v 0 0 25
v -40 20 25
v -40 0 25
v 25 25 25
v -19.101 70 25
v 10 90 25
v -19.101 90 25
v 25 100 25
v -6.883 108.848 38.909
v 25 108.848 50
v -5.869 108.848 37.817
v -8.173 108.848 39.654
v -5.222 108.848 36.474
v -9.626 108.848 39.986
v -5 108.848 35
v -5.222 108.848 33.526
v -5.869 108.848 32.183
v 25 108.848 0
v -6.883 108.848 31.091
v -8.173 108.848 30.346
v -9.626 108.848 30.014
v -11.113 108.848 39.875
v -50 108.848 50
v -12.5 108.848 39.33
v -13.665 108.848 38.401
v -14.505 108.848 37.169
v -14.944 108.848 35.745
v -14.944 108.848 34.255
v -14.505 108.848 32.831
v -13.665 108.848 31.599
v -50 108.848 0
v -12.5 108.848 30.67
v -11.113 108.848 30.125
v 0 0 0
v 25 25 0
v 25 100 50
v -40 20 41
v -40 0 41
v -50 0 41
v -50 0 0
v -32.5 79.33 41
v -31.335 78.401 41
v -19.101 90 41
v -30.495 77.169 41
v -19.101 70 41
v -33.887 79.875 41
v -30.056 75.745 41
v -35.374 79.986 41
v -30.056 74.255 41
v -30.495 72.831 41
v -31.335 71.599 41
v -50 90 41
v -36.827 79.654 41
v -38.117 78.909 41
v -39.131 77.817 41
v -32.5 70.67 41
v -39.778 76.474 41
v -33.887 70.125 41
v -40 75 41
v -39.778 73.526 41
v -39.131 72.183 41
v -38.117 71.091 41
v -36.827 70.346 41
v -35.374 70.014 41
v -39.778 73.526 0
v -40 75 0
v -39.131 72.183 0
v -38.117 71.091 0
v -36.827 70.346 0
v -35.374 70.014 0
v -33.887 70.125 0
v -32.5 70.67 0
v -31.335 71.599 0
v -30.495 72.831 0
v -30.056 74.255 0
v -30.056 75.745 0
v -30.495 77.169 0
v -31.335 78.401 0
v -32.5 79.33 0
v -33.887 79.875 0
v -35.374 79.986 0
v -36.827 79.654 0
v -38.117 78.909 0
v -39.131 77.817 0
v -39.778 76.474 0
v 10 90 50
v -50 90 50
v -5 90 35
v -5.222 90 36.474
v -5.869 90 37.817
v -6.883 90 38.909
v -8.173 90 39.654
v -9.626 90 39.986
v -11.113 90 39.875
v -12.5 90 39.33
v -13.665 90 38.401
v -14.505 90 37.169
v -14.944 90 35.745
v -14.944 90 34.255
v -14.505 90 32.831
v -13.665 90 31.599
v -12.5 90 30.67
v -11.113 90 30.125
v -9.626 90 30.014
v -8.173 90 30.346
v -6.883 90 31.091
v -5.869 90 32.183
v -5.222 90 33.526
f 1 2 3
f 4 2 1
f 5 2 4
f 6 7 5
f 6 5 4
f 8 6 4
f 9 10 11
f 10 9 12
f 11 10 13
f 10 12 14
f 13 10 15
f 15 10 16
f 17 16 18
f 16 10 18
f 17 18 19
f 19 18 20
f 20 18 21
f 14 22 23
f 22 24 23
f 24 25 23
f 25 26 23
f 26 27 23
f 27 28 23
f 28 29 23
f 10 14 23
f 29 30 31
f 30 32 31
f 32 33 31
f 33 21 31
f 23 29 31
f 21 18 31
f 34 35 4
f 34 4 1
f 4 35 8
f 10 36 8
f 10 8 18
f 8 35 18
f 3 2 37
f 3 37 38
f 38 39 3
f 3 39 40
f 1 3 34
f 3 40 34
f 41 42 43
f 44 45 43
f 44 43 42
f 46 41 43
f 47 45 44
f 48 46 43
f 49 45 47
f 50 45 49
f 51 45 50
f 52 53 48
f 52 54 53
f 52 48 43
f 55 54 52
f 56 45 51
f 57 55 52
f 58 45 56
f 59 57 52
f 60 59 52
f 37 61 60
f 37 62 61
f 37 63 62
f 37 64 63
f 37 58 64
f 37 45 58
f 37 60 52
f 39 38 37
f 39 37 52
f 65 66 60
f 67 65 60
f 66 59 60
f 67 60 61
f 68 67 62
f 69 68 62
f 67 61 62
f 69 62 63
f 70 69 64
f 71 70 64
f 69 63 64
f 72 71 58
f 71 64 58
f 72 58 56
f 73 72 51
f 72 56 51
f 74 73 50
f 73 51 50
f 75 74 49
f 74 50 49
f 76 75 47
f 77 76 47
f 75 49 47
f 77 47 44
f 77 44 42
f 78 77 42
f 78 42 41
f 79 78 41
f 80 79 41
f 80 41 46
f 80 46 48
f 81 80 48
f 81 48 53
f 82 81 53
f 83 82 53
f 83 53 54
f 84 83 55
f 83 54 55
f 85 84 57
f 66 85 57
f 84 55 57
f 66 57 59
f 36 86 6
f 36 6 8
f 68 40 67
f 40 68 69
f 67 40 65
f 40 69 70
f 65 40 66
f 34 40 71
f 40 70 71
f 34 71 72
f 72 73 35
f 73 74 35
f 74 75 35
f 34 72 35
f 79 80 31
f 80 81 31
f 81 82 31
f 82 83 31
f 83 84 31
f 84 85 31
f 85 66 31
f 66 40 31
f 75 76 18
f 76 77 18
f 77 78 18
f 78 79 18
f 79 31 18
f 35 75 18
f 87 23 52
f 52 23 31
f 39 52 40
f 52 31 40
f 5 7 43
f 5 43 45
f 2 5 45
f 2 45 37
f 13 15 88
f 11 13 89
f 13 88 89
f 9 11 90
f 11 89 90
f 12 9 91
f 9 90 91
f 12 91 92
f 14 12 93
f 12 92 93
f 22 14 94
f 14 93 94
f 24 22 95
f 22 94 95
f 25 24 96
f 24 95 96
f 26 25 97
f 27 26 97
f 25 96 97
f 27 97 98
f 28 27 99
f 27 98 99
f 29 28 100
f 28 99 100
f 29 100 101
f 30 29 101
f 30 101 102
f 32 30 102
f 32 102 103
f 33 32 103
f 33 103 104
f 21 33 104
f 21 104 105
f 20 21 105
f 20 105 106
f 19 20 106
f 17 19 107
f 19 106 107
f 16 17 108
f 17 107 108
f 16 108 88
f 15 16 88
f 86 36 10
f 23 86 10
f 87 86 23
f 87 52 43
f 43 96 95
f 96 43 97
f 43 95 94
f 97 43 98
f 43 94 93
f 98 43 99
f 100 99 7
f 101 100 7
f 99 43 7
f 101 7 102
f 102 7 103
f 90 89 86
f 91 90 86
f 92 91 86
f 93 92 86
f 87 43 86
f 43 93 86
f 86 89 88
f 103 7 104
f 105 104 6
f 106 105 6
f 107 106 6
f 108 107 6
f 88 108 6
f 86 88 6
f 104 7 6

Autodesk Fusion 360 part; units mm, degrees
sketch "Sketch1" plane through (0, 0, 0) normal (0, 0, 1) x (1, 0, 0)
  line L0 (-50, 0) -> (0, 0)
  line L1 (25, 25) -> (0, 0)
  line L2 (-50, 0) -> (-50, 140)
  line L3 (21.9831, 108.8475) -> (-62.7657, 108.8475)
  line L4 (-50, 108.8475) -> (-62.7657, 108.8475)
  line L5 (25, 25) -> (25, 110)
  line L6 (21.9831, 108.8475) -> (25, 108.8475)
extrude "Extrude1" add sketch "Sketch1" along normal blind 25
sketch "Sketch2" plane through (0, 0, 25) normal (0, 0, 1) x (-1, 0, 0)
  line L0 (-25, -108.8475) -> (50, -108.8475)
  line L1 (50, -108.8475) -> (50, 0)
  line L2 (50, 0) -> (0, 0)
  line L3 (0, 0) -> (-25, -25)
  line L4 (-25, -25) -> (-25, -108.8475)
sketch "Sketch3" plane through (0, 0, 25) normal (0, 0, 1) x (-1, 0, 0)
  line L0 (-10, -90) -> (-25, -97)
  line L1 (-25, -108.8475) -> (-25, -97)
  line L2 (-10, -90) -> (50, -90)
  line L3 (19.1012, -90) -> (19.1012, -70)
  line L4 (19.1012, -70) -> (40, -20)
  line L5 (40, -20) -> (40, 0)
  line L6 (40, 0) -> (50, 0)
  line L7 (50, 0) -> (50, -108.8475)
  line L8 (50, -90) -> (50, -108.8475)
  line L9 (-25, -97) -> (-25, -108.8475)
  line L10 (50, -108.8475) -> (50, -90)
  point P0 (-25, -108.8475)
  point P1 (50, 0)
  point P2 (50, -108.8475)
extrude "Extrude2" add sketch "Sketch3" along normal blind 16
sketch "Sketch4" plane through (0, 0, 25) normal (0, 0, 1) x (-1, 0, 0)
  line L0 (-10, -90) -> (-25, -100)
  line L1 (-25, -108.8475) -> (-25, -100)
  line L2 (-25, -108.8475) -> (50, -108.8475)
  line L3 (50, -108.8475) -> (50, -90)
  line L4 (50, -90) -> (-10, -90)
  point P0 (-25, -108.8475)
  point P1 (50, -108.8475)
extrude "Extrude3" add sketch "Sketch4" along normal blind 25
sketch "Sketch5" plane through (0, 0, 41) normal (0, 0, 1) x (-1, 0, 0)
  line L0 (19.1012, -90) -> (50, -90)
  line L1 (50, -90) -> (50, 0)
  line L2 (50, 0) -> (40, 0)
  line L3 (40, 0) -> (40, -20)
  line L4 (40, -20) -> (19.1012, -70)
  line L5 (19.1012, -70) -> (19.1012, -90)
  circle A0 centre (35, -75) radius 5
extrude "Extrude4" cut sketch "Sketch5" against normal blind 41 contours A0
sketch "Sketch6" plane through (0, 90, 0) normal (0, -1, 0) x (1, 0, 0)
  line L0 (-50, 41) -> (-19.1012, 41)
  line L1 (-19.1012, 41) -> (-19.1012, 25)
  line L2 (-19.1012, 25) -> (10, 25)
  line L3 (10, 25) -> (10, 50)
  line L4 (10, 50) -> (-50, 50)
  line L5 (-50, 50) -> (-50, 41)
  circle A0 centre (-10, 35) radius 5
  dimension "d11" = 10
extrude "Extrude5" cut sketch "Sketch6" against normal blind 25 contours A0
